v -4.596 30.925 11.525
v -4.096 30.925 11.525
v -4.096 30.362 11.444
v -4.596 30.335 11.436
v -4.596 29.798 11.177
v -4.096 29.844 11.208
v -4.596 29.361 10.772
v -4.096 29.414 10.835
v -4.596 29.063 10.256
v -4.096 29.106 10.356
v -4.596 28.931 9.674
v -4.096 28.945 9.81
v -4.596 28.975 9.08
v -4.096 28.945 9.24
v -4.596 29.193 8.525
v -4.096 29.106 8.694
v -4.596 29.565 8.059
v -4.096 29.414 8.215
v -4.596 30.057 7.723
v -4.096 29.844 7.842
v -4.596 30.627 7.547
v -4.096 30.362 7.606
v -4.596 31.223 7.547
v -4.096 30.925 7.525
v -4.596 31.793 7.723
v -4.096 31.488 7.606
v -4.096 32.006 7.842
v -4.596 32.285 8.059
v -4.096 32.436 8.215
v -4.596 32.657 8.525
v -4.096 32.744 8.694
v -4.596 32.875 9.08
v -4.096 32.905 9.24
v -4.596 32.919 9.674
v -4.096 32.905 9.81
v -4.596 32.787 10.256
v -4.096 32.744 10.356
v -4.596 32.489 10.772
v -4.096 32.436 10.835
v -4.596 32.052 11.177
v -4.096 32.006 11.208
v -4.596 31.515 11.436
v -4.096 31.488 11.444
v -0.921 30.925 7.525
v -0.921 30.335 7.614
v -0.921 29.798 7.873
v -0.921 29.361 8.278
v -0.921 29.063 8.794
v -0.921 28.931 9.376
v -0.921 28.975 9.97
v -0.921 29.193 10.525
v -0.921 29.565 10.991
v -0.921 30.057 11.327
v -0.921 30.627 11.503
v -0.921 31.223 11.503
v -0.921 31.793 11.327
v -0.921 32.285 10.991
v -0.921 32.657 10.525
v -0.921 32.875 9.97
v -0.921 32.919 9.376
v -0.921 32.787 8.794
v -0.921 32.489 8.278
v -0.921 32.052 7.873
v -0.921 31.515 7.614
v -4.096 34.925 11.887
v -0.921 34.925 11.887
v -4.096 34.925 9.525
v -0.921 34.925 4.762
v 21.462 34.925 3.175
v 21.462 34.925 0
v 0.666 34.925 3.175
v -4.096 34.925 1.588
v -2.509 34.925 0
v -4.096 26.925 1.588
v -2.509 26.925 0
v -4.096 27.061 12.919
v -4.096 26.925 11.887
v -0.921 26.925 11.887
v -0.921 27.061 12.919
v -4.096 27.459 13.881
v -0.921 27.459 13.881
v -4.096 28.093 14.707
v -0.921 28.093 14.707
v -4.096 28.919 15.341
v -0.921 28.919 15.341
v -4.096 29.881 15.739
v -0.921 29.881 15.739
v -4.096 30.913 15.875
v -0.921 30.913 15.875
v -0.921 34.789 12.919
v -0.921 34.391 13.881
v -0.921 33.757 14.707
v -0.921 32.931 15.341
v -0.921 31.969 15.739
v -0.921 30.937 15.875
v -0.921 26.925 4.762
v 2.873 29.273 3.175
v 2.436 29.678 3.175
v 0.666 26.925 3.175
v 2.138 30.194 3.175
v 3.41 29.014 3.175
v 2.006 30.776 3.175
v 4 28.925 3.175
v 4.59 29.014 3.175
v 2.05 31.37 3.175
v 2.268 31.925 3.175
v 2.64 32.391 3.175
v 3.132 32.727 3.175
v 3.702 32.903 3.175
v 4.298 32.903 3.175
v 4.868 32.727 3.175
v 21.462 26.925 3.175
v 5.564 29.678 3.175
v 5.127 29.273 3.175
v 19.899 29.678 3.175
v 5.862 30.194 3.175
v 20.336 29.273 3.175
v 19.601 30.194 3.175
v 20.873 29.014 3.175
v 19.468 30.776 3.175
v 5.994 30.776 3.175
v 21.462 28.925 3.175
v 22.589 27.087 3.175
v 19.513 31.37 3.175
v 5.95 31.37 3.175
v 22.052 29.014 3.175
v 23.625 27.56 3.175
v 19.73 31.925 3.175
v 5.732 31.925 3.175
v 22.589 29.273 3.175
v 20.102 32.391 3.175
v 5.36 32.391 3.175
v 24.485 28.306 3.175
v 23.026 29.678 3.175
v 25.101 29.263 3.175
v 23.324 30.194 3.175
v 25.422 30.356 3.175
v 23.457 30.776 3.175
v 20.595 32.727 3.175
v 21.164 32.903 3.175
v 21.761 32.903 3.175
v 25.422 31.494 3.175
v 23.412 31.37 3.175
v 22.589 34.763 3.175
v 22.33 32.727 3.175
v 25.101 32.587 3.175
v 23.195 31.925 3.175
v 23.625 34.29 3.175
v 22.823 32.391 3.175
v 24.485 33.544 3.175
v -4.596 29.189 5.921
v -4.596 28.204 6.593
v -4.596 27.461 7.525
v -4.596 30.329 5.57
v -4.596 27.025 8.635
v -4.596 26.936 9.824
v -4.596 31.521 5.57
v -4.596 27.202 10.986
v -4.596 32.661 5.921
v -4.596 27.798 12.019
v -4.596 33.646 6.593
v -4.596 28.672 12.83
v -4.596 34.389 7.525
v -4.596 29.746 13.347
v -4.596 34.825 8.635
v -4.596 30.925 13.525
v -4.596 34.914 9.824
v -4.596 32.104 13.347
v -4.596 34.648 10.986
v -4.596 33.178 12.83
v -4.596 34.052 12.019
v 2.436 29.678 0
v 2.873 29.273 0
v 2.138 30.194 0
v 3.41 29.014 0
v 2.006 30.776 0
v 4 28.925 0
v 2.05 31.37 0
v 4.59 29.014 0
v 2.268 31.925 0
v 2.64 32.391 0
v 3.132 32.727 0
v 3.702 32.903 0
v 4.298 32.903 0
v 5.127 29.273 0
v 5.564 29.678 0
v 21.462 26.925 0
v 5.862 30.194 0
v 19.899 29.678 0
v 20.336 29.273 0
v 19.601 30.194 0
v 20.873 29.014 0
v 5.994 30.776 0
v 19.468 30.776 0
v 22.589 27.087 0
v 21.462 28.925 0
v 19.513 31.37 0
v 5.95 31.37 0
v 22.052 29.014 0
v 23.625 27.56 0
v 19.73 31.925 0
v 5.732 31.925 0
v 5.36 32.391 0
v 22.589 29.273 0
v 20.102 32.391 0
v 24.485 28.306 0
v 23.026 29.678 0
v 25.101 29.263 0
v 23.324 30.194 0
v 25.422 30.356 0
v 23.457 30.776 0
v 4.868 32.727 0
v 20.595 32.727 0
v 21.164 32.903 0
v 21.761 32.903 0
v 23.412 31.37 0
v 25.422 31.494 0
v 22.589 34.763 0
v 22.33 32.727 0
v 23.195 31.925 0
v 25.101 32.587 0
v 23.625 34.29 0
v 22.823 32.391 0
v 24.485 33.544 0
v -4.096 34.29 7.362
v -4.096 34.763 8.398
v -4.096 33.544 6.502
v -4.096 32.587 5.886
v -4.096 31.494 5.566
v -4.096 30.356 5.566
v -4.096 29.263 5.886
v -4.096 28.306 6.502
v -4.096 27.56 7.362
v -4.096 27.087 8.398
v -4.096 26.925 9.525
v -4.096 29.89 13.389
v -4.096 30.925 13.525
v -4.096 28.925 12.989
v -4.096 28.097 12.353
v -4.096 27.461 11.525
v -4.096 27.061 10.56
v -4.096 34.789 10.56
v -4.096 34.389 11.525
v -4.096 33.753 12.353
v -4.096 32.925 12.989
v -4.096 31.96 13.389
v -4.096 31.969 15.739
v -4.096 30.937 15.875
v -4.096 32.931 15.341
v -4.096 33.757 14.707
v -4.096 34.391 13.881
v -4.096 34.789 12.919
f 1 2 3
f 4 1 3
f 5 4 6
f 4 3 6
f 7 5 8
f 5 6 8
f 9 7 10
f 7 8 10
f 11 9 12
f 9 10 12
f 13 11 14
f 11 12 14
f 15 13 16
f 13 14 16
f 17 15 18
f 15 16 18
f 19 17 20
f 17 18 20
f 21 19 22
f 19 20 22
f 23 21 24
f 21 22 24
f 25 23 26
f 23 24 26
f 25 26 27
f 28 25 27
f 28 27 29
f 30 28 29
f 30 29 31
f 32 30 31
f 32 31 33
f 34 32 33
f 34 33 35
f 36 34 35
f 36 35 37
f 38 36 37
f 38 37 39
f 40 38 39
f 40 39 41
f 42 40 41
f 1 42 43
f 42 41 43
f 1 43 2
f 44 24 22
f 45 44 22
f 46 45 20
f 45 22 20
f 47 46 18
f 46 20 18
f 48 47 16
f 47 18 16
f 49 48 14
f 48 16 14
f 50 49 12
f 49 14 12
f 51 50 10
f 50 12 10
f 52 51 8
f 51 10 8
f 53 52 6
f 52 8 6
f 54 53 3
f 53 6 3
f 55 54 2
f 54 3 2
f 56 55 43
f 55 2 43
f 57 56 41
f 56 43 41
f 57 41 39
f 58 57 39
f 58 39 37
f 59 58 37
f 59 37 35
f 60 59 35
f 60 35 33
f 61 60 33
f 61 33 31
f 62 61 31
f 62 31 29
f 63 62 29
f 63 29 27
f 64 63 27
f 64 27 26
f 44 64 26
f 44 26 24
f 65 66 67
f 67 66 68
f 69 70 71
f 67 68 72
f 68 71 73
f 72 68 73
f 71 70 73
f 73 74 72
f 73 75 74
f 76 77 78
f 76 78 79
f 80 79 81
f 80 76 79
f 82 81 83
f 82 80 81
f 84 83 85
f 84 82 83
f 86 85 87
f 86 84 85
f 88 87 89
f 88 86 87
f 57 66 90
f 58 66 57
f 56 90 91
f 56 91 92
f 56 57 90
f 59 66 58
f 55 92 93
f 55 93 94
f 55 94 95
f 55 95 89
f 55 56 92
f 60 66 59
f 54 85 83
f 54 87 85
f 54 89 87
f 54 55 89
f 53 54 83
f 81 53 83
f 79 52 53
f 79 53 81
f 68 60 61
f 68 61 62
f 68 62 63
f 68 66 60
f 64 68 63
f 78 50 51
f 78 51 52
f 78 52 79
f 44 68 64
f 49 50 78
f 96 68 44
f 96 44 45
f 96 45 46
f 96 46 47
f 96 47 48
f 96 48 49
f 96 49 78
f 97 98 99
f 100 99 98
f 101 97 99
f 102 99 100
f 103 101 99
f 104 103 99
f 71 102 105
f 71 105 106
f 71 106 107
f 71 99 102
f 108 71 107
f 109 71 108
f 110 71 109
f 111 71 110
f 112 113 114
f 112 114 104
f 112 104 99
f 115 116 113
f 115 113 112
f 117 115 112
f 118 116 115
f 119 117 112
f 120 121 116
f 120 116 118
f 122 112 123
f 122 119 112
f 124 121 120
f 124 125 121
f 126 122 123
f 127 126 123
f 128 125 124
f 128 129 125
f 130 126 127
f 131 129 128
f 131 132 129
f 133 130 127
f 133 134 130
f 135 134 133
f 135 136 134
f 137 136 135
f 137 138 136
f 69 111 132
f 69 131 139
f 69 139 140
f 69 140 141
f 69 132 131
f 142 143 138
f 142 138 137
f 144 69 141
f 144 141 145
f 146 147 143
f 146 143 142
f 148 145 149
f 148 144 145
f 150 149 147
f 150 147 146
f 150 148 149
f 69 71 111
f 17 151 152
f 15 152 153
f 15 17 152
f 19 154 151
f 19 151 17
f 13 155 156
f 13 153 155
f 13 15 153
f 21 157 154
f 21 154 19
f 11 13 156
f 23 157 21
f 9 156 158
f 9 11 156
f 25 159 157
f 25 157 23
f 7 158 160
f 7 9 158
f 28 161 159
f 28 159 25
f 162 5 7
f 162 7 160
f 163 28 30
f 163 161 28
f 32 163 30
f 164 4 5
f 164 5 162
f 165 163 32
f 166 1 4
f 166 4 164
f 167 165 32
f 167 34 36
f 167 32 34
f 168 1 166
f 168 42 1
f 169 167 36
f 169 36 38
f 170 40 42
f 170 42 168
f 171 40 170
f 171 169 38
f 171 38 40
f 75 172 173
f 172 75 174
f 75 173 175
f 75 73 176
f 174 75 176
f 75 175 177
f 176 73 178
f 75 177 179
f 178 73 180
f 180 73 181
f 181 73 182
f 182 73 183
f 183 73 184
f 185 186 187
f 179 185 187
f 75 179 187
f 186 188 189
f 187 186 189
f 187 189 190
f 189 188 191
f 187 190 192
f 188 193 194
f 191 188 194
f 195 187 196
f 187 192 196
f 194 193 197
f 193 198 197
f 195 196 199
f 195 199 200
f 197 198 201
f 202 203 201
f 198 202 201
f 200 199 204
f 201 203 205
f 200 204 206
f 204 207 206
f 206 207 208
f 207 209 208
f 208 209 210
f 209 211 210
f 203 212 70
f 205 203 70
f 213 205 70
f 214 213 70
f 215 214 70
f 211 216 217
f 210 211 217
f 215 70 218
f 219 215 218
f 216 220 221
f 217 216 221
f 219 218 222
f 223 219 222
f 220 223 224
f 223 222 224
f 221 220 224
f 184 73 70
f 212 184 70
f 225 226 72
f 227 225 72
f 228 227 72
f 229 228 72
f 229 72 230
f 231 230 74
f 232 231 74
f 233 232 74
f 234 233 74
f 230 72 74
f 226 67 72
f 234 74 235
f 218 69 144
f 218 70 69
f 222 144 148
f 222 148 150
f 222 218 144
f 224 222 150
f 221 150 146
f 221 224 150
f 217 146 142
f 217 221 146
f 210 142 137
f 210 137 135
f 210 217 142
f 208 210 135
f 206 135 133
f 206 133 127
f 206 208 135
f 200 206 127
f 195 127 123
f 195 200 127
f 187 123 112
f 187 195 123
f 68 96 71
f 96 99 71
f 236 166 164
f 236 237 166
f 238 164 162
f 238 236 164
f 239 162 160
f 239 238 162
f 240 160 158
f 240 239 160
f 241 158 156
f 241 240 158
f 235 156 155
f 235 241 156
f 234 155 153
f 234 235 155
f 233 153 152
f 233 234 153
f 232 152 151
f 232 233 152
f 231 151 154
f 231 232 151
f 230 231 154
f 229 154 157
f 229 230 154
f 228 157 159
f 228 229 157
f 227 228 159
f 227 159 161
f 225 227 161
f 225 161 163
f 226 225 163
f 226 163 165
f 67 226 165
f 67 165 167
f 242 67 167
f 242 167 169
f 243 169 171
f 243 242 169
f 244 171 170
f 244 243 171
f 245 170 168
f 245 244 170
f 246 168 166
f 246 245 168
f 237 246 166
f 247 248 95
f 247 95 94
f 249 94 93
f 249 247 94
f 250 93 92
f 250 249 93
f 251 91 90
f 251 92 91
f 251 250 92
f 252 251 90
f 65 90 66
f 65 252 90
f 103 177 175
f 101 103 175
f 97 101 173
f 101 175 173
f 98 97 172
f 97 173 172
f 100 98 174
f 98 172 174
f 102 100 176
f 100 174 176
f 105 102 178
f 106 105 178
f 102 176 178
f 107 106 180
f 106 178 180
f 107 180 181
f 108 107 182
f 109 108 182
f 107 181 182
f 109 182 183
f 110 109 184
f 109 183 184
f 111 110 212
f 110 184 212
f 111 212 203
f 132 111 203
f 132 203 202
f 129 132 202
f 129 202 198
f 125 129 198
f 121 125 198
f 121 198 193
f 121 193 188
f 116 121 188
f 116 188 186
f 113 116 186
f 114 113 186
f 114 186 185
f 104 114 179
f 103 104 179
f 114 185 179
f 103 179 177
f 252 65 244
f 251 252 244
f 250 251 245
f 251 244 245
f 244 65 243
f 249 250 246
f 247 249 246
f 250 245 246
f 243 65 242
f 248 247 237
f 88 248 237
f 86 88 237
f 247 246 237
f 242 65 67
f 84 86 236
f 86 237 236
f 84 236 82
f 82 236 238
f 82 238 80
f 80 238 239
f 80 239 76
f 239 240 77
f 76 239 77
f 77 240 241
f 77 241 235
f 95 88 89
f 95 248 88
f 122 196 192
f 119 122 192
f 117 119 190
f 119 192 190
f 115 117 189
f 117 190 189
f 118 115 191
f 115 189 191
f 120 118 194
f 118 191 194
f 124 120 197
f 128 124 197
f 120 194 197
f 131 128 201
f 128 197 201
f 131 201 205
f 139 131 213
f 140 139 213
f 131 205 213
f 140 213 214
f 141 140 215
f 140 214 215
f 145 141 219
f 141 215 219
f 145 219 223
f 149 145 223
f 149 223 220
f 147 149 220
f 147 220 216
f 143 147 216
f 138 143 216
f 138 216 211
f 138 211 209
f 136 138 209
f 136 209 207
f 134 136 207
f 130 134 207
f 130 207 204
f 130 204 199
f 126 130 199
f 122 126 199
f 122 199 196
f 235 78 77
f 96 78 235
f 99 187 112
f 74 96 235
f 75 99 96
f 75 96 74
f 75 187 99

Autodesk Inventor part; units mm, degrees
ref_plane "YZ Plane" through (0, 0, 0) normal (1, 0, 0) x (0, 1, 0)
ref_plane "XZ Plane" through (0, 0, 0) normal (0, 1, 0) x (-1, 0, 0)
ref_plane "XY Plane" through (0, 0, 0) normal (0, 0, 1) x (1, 0, 0)
ref_plane "Work Plane1" through (0, 0, 0) normal (0, 0, 1) x (1, 0, 0)
sketch "Sketch1" plane through (0, 0, 0) normal (0, 0, 1) x (1, 0, 0)
  circle A0 centre (21.4625, 30.925) radius 2 projected
  line L0 (0, 34.925) -> (25.4, 34.925) projected
  line L1 (0, 0) -> (0, 34.925) projected
  line L2 (0, 0) -> (2.54, 0) projected
  arc A1 (2.54, 0) -> (24.765, 0) centre (13.6525, 6.1484) ccw projected
  line L3 (24.765, 0) -> (24.765, 25.2044) projected
  arc A2 (24.765, 25.2044) -> (26.5659, 26.7312) centre (21.4625, 30.925) ccw projected
  spline S0 degree 3 poles (25.4, 34.925) (25.7861, 32.1988) (26.1753, 29.4627) (26.5659, 26.7312) knots -1.120112 -1.120112 -1.120112 -1.120112 -0.293842 -0.293842 -0.293842 -0.293842 projected
  circle A3 centre (4, 30.925) radius 2 projected
  circle A4 centre (21.4625, 30.925) radius 2
  circle A5 centre (21.4625, 30.925) radius 4
  circle A6 centre (4, 30.925) radius 2
  circle A7 centre (4, 30.925) radius 4
  line L4 (21.4625, 34.925) -> (4, 34.925)
  line L5 (4, 34.925) -> (4, 26.925)
  line L6 (4, 26.925) -> (21.4625, 26.925)
  line L7 (21.4625, 26.925) -> (21.4625, 34.925)
  line L8 (-4.0963, 34.925) -> (-4.0963, 26.925)
  line L9 (4, 34.925) -> (-4.0963, 34.925)
  line L10 (4, 26.925) -> (-4.0963, 26.925)
  line L11 (-4.0963, 34.925) -> (-0.9213, 34.925)
  line L12 (-0.9213, 34.925) -> (-0.9213, 26.925)
  line L13 (-0.9213, 26.925) -> (-4.0963, 26.925)
  line L14 (-4.0963, 26.925) -> (-4.0963, 34.925)
  circle A8 centre (12.7313, 10.2875) radius 7.9375 projected
  point P0 (-20.6063, 34.925)
  dimension "d0" = 16.51
  dimension "d1" = 3.175
  dimension "d2" = 8
extrude "Extrusion1" add sketch "Sketch1" along normal blind 3.175 contours A0 L7 | A0 L7 A5 | L7 A0 | A0 L7 A5 | A5 L6 A7 L0 | A7 L1 L0 | L5 A3 A7 | A7 L5 A3 | L10 L1 A7 | L1 L10 L12 L9 | L5 A3 | A3 L5 | L12 L10 L8 L9
sketch "Sketch2" plane through (0, 0, 3.175) normal (0, 0, 1) x (1, 0, 0)
  line L0 (-0.9213, 34.925) -> (-0.9213, 26.925) projected
  line L1 (-4.0963, 34.925) -> (-4.0963, 26.925) projected
  line L2 (4, 26.925) -> (-4.0963, 26.925) projected
  line L3 (4, 34.925) -> (-4.0963, 34.925) projected
  point P0 (0, 0)
extrude "Extrusion2" add sketch "Sketch2" along normal blind 12.7
fillet "Fillet1" radius 3.9878 2 edges at (-2.5088, 34.925, 15.875) (-2.5088, 26.925, 15.875)
sketch "Sketch3" plane through (-0.9213, 26.925, 3.175) normal (1, 0, 0) x (0, 0, -1)
  line L0 (0, 8) -> (0, 0) projected
  point P0 (3.175, -26.925)
  point P1 (-6.35, 4)
  point P2 (0, 4)
  point P3 (0, 4)
  dimension "d8" = 6.35
hole "Hole1" at (-0.9213, 30.925, 9.525) direction (-1, 0, 0) diameter 4 end through all
sketch "Sketch6" plane through (0, 0, 3.175) normal (0, 0, 1) x (1, 0, 0)
  circle A0 centre (21.4625, 30.925) radius 2 projected
  line L0 (0, 34.925) -> (25.4, 34.925) projected
  line L1 (0, 0) -> (0, 34.925) projected
  line L2 (0, 0) -> (2.54, 0) projected
  arc A1 (2.54, 0) -> (24.765, 0) centre (13.6525, 6.1484) ccw projected
  line L3 (24.765, 0) -> (24.765, 25.2044) projected
  arc A2 (24.765, 25.2044) -> (26.5659, 26.7312) centre (21.4625, 30.925) ccw projected
  spline S0 degree 3 poles (25.4, 34.925) (25.7861, 32.1988) (26.1753, 29.4627) (26.5659, 26.7312) knots -1.120112 -1.120112 -1.120112 -1.120112 -0.293842 -0.293842 -0.293842 -0.293842 projected
  circle A3 centre (4, 30.925) radius 2 projected
  circle A4 centre (12.7313, 10.2875) radius 7.9375 projected
  point P0 (21.4625, 30.925)
  point P1 (4, 30.925)
hole "Hole2" at (21.4625, 30.925, 3.175) at (4, 30.925, 3.175) direction (0, 0, -1) diameter 4 end through all both
chamfer "Chamfer5" distance 1.5875 angle 45 1 edges at (-0.9213, 30.925, 3.175)
chamfer "Chamfer6" distance 1.5875 angle 45 1 edges at (-4.0963, 30.925, 0)
sketch "Sketch7" plane through (-4.0963, 26.925, 1.5875) normal (-1, 0, 0) x (0, 0, 1)
  circle A0 centre (7.9375, 4) radius 2 projected
  circle A1 centre (7.9375, 4) radius 4
  line L0 (3.175, 8) -> (10.2997, 8) projected
  point P0 (-1.5875, -26.925)
extrude "Extrusion5" add sketch "Sketch7" along normal blind 0.5
properties part number "Sensor Mount"
